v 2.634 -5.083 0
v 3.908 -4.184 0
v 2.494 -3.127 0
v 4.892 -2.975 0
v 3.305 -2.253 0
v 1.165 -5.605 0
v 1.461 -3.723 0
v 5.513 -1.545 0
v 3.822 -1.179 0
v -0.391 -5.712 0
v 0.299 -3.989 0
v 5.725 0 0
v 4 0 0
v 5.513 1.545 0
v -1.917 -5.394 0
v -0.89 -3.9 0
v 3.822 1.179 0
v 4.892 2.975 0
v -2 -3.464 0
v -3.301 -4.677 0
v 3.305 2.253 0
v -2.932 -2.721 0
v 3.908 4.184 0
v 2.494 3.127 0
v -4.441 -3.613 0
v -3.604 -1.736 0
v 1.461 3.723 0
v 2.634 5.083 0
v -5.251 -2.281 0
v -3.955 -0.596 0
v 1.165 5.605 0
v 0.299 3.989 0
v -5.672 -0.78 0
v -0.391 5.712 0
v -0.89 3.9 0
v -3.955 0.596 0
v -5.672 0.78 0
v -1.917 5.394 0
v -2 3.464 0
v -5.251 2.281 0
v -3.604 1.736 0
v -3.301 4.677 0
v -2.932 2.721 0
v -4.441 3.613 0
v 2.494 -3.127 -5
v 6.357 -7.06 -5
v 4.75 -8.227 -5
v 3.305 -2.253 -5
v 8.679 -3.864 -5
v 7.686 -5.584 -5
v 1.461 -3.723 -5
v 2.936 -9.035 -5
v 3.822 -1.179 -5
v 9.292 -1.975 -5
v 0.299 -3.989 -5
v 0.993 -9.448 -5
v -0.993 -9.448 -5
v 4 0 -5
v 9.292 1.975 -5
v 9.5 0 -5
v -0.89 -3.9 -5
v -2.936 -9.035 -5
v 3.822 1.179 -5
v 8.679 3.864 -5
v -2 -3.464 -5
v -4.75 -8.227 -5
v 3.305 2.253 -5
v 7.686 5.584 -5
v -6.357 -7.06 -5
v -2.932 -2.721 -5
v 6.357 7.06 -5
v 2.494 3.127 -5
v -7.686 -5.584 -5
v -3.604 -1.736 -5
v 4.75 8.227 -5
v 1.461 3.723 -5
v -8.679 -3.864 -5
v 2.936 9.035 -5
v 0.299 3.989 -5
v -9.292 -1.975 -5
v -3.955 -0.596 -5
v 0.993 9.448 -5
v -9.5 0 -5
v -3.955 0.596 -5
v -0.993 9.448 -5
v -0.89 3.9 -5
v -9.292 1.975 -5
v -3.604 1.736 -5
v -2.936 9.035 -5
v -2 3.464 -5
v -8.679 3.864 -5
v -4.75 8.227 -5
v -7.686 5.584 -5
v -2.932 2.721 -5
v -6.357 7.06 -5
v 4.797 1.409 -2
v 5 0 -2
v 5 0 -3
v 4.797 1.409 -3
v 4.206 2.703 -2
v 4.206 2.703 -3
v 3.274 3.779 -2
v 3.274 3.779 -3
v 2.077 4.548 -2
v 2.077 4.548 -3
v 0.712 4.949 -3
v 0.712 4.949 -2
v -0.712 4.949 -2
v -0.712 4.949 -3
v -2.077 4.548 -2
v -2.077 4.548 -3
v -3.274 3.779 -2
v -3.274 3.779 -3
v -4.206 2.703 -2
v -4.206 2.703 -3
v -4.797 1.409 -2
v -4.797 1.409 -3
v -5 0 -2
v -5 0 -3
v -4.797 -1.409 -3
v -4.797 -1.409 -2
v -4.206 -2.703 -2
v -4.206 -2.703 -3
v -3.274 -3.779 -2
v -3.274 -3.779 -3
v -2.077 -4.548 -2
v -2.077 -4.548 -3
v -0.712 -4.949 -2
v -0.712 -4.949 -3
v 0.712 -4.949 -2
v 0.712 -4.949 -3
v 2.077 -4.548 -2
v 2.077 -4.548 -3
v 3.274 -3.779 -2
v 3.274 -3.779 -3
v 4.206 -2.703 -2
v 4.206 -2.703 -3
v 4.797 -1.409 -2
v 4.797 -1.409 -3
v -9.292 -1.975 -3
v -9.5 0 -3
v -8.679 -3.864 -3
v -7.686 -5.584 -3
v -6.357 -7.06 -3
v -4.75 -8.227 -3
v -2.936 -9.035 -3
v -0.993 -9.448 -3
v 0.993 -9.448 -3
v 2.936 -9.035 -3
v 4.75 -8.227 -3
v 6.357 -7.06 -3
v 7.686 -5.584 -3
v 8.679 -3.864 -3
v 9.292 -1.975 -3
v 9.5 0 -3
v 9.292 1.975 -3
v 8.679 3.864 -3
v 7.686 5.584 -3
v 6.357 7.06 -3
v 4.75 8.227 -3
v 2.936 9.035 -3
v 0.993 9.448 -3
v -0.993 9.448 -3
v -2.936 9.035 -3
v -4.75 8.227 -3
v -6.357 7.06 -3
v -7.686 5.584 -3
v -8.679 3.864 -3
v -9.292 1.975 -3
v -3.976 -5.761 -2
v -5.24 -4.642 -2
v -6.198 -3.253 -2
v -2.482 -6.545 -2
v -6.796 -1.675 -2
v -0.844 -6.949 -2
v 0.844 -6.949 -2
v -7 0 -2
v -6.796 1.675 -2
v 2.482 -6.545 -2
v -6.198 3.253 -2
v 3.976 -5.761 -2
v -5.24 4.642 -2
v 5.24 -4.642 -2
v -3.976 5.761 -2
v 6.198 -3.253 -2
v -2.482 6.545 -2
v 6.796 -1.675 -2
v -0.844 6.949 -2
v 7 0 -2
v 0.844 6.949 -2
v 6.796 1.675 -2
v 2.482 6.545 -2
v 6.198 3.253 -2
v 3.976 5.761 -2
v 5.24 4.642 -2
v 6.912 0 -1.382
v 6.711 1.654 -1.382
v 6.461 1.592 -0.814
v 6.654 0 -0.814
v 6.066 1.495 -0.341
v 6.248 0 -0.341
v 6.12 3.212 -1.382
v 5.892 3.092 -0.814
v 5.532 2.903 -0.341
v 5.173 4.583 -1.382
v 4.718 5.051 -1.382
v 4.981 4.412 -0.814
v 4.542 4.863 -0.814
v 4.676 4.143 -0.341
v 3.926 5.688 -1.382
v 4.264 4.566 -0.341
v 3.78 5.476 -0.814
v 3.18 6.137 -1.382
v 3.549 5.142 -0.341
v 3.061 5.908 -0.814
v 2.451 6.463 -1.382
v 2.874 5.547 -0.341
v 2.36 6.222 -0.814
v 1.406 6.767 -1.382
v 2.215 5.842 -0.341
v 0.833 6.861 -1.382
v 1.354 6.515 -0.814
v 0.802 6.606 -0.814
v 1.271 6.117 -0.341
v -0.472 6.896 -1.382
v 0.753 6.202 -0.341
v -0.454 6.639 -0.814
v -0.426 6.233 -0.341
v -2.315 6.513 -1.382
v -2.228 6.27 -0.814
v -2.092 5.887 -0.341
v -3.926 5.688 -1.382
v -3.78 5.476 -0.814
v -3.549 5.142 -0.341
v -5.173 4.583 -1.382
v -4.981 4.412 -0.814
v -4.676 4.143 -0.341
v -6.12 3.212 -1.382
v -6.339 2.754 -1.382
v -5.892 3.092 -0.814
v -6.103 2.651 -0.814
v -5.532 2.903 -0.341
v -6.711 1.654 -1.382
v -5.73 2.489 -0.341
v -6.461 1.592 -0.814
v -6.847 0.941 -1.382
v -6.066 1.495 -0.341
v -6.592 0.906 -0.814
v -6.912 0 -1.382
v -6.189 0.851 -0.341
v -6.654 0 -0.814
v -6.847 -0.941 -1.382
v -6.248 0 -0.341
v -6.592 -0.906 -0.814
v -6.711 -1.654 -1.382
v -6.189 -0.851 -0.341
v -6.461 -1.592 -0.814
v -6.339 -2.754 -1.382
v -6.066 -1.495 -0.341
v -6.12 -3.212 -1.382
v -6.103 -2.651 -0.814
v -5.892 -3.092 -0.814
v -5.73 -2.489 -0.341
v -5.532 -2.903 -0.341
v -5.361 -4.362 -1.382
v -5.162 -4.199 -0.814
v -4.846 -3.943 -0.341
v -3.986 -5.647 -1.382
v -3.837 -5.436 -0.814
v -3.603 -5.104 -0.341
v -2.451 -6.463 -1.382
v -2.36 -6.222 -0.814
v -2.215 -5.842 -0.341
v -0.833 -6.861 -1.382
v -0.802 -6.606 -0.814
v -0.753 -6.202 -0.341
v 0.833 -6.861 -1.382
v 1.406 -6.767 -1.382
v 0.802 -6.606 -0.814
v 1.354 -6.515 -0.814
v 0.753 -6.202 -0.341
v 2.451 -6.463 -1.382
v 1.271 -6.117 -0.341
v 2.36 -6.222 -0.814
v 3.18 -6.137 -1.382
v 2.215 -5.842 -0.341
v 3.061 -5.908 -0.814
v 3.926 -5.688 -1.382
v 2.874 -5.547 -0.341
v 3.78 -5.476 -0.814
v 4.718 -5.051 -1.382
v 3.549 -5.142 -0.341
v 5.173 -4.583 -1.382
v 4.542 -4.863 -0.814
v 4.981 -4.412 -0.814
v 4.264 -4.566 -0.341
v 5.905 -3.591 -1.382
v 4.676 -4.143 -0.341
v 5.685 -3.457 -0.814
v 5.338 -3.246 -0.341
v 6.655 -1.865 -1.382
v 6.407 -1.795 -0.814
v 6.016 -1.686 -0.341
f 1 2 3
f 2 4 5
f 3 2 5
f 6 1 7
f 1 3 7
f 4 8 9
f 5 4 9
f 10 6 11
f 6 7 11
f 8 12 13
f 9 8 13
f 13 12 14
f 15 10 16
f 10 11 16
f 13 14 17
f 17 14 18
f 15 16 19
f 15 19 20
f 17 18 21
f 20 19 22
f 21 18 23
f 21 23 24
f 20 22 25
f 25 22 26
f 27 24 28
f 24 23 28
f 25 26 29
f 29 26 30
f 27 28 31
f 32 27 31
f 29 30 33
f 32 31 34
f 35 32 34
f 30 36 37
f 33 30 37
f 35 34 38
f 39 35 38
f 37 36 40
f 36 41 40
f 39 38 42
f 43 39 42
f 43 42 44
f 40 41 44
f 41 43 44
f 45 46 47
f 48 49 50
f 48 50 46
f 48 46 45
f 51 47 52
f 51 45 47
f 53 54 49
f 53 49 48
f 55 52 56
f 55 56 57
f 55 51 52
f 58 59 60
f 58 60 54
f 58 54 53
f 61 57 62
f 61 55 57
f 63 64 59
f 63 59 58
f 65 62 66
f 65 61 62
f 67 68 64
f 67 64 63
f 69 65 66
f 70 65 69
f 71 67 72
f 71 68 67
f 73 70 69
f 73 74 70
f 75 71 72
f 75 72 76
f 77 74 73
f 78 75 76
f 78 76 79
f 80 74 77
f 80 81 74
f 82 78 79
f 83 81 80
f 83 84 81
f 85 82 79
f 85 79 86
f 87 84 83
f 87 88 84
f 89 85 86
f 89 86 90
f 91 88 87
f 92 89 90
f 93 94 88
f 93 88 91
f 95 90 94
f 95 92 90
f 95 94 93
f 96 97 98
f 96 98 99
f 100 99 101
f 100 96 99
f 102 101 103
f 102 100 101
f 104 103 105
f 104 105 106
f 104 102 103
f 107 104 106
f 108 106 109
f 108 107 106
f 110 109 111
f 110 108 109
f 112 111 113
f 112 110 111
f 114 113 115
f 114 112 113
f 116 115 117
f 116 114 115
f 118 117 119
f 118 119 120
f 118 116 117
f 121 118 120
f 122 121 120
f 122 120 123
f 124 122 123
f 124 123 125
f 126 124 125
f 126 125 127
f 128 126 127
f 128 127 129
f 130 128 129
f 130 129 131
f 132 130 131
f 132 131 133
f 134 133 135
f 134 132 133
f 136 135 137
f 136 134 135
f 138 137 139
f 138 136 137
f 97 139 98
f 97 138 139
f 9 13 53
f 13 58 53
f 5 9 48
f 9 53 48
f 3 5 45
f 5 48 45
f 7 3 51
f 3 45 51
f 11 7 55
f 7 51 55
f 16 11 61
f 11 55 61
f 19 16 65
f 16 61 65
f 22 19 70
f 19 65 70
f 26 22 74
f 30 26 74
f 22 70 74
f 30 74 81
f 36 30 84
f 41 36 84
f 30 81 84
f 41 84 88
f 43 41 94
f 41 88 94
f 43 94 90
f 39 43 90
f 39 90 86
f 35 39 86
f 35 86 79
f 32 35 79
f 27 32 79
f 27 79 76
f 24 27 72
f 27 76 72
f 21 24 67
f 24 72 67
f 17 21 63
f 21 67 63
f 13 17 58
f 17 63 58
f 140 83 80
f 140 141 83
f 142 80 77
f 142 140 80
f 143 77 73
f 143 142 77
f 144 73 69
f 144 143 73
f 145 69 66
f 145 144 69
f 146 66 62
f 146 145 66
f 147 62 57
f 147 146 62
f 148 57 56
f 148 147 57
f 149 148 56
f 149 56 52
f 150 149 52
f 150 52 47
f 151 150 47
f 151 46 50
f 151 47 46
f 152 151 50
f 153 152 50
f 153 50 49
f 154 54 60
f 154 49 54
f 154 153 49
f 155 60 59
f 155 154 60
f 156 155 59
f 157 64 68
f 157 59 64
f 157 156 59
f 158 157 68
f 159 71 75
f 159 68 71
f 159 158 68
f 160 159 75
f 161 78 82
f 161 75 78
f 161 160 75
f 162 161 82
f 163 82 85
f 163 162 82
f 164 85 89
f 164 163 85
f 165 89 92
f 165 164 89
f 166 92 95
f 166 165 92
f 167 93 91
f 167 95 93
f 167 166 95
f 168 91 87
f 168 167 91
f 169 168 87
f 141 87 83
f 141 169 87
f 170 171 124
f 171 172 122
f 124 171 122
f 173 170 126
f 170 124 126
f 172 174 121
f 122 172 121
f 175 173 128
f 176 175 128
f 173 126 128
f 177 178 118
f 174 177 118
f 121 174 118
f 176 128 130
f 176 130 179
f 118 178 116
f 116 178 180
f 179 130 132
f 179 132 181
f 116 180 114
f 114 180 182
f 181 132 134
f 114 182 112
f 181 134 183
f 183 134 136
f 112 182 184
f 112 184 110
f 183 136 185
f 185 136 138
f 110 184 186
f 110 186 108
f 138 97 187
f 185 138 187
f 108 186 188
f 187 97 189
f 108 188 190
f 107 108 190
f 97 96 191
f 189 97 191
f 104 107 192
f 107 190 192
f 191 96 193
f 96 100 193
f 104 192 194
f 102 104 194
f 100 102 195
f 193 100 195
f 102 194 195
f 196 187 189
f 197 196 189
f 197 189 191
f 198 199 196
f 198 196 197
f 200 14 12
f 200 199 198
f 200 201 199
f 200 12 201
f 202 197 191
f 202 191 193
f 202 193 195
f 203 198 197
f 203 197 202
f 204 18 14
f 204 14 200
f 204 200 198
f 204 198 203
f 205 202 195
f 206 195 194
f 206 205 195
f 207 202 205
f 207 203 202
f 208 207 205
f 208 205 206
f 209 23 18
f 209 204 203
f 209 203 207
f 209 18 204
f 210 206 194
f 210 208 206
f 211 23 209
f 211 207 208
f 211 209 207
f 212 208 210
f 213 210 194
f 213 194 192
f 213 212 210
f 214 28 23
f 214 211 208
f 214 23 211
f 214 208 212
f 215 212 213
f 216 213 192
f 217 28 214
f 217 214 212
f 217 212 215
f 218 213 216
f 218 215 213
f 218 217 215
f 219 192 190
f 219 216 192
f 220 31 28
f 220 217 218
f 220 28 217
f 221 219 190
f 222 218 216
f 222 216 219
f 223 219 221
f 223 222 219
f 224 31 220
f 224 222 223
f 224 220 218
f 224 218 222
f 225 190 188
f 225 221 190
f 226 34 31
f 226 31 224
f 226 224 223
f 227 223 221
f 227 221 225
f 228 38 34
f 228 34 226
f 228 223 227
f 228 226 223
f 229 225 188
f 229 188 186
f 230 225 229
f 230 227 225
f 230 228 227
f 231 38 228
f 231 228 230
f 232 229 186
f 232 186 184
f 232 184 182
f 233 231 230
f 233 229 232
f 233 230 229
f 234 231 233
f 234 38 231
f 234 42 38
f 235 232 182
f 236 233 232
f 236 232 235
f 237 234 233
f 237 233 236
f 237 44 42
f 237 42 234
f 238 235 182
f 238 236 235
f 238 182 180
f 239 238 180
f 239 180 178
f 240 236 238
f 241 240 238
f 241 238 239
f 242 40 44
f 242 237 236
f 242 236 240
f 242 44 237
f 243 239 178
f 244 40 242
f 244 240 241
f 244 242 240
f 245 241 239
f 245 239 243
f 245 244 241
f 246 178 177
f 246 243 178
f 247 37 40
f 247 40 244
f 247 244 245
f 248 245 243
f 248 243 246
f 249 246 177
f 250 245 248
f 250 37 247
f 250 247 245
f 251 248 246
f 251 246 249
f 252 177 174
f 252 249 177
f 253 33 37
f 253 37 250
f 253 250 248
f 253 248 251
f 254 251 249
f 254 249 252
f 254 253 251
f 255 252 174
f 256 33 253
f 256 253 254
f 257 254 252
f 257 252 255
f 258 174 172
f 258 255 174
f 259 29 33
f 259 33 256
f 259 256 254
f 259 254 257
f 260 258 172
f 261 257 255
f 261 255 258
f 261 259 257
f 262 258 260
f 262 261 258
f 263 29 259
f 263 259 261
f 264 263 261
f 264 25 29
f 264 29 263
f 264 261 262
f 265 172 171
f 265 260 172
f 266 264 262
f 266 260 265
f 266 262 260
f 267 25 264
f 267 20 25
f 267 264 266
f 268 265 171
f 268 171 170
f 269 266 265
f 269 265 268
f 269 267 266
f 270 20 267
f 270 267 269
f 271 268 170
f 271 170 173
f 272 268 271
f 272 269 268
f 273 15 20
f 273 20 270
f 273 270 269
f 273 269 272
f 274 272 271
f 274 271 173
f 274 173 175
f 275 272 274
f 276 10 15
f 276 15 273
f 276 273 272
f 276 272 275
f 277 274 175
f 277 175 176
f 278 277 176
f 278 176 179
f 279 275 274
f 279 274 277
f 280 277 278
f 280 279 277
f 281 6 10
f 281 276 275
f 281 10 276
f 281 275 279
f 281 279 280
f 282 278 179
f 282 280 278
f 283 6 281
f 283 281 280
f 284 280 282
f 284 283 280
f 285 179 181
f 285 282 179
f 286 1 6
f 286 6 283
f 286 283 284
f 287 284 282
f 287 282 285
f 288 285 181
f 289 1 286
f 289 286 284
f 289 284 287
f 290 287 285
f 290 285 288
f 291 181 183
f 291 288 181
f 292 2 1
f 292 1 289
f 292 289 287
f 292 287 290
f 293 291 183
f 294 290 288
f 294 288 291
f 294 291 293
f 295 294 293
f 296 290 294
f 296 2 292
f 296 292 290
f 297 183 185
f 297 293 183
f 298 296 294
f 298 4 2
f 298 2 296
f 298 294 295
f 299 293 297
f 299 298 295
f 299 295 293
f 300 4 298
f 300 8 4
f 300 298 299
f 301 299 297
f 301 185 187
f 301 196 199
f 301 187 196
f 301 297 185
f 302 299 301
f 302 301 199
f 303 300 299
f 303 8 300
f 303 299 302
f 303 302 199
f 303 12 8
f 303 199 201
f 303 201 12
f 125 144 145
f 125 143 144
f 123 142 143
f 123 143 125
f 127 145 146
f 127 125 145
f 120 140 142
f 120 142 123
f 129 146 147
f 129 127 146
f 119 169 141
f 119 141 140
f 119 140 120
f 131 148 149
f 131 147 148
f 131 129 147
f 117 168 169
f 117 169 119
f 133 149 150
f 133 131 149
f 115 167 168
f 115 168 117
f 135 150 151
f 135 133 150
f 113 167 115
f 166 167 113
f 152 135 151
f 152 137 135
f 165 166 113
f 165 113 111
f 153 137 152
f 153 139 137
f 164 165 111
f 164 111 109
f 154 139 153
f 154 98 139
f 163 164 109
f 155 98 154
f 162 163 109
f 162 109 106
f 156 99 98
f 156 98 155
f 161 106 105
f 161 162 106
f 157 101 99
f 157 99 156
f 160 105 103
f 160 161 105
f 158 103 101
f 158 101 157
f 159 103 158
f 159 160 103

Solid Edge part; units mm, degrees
sketch "Sketch1" plane through (0, 0, 0) normal (0, 0, -1) x (-1, 0, 0)
  circle A0 centre (0, 0) radius 9.5
extrude "Protrusion1" add sketch "Sketch1" along normal blind 5
sketch "Sketch2" plane through (0, 0, -5) normal (0, 0, -1) x (1, 0, 0)
  circle A0 centre (0, 0) radius 4
extrude "Kivágás_1" cut sketch "Sketch2" against normal blind 7.7152
sketch "Sketch3" plane through (0, 0, 0) normal (0, 1, 0) x (-1, 0, 0)
  line L0 (-9.5, -3) -> (-7, -3)
  line L1 (-7, -3) -> (-5, -3)
  line L2 (-5, -3) -> (-5, -2)
  line L3 (-5, -2) -> (-7, -2)
  arc A0 (-7, -2) -> (-5.725, 0) centre (-4.7939, -2) cw
  line L4 (-5.6957, 1.469) -> (-5.725, 0)
  line L5 (-11.4658, 1.2586) -> (-5.6957, 1.469)
  line L6 (-12.1673, -3) -> (-11.4658, 1.2586)
  line L7 (-9.5, -3) -> (-12.1673, -3)
revolve "RevolvedCutout1" cut sketch "Sketch3" angle 360 about axis through (0, 0, 0) along (0, 0, 1)
properties material "Réz, sárgaréz"
